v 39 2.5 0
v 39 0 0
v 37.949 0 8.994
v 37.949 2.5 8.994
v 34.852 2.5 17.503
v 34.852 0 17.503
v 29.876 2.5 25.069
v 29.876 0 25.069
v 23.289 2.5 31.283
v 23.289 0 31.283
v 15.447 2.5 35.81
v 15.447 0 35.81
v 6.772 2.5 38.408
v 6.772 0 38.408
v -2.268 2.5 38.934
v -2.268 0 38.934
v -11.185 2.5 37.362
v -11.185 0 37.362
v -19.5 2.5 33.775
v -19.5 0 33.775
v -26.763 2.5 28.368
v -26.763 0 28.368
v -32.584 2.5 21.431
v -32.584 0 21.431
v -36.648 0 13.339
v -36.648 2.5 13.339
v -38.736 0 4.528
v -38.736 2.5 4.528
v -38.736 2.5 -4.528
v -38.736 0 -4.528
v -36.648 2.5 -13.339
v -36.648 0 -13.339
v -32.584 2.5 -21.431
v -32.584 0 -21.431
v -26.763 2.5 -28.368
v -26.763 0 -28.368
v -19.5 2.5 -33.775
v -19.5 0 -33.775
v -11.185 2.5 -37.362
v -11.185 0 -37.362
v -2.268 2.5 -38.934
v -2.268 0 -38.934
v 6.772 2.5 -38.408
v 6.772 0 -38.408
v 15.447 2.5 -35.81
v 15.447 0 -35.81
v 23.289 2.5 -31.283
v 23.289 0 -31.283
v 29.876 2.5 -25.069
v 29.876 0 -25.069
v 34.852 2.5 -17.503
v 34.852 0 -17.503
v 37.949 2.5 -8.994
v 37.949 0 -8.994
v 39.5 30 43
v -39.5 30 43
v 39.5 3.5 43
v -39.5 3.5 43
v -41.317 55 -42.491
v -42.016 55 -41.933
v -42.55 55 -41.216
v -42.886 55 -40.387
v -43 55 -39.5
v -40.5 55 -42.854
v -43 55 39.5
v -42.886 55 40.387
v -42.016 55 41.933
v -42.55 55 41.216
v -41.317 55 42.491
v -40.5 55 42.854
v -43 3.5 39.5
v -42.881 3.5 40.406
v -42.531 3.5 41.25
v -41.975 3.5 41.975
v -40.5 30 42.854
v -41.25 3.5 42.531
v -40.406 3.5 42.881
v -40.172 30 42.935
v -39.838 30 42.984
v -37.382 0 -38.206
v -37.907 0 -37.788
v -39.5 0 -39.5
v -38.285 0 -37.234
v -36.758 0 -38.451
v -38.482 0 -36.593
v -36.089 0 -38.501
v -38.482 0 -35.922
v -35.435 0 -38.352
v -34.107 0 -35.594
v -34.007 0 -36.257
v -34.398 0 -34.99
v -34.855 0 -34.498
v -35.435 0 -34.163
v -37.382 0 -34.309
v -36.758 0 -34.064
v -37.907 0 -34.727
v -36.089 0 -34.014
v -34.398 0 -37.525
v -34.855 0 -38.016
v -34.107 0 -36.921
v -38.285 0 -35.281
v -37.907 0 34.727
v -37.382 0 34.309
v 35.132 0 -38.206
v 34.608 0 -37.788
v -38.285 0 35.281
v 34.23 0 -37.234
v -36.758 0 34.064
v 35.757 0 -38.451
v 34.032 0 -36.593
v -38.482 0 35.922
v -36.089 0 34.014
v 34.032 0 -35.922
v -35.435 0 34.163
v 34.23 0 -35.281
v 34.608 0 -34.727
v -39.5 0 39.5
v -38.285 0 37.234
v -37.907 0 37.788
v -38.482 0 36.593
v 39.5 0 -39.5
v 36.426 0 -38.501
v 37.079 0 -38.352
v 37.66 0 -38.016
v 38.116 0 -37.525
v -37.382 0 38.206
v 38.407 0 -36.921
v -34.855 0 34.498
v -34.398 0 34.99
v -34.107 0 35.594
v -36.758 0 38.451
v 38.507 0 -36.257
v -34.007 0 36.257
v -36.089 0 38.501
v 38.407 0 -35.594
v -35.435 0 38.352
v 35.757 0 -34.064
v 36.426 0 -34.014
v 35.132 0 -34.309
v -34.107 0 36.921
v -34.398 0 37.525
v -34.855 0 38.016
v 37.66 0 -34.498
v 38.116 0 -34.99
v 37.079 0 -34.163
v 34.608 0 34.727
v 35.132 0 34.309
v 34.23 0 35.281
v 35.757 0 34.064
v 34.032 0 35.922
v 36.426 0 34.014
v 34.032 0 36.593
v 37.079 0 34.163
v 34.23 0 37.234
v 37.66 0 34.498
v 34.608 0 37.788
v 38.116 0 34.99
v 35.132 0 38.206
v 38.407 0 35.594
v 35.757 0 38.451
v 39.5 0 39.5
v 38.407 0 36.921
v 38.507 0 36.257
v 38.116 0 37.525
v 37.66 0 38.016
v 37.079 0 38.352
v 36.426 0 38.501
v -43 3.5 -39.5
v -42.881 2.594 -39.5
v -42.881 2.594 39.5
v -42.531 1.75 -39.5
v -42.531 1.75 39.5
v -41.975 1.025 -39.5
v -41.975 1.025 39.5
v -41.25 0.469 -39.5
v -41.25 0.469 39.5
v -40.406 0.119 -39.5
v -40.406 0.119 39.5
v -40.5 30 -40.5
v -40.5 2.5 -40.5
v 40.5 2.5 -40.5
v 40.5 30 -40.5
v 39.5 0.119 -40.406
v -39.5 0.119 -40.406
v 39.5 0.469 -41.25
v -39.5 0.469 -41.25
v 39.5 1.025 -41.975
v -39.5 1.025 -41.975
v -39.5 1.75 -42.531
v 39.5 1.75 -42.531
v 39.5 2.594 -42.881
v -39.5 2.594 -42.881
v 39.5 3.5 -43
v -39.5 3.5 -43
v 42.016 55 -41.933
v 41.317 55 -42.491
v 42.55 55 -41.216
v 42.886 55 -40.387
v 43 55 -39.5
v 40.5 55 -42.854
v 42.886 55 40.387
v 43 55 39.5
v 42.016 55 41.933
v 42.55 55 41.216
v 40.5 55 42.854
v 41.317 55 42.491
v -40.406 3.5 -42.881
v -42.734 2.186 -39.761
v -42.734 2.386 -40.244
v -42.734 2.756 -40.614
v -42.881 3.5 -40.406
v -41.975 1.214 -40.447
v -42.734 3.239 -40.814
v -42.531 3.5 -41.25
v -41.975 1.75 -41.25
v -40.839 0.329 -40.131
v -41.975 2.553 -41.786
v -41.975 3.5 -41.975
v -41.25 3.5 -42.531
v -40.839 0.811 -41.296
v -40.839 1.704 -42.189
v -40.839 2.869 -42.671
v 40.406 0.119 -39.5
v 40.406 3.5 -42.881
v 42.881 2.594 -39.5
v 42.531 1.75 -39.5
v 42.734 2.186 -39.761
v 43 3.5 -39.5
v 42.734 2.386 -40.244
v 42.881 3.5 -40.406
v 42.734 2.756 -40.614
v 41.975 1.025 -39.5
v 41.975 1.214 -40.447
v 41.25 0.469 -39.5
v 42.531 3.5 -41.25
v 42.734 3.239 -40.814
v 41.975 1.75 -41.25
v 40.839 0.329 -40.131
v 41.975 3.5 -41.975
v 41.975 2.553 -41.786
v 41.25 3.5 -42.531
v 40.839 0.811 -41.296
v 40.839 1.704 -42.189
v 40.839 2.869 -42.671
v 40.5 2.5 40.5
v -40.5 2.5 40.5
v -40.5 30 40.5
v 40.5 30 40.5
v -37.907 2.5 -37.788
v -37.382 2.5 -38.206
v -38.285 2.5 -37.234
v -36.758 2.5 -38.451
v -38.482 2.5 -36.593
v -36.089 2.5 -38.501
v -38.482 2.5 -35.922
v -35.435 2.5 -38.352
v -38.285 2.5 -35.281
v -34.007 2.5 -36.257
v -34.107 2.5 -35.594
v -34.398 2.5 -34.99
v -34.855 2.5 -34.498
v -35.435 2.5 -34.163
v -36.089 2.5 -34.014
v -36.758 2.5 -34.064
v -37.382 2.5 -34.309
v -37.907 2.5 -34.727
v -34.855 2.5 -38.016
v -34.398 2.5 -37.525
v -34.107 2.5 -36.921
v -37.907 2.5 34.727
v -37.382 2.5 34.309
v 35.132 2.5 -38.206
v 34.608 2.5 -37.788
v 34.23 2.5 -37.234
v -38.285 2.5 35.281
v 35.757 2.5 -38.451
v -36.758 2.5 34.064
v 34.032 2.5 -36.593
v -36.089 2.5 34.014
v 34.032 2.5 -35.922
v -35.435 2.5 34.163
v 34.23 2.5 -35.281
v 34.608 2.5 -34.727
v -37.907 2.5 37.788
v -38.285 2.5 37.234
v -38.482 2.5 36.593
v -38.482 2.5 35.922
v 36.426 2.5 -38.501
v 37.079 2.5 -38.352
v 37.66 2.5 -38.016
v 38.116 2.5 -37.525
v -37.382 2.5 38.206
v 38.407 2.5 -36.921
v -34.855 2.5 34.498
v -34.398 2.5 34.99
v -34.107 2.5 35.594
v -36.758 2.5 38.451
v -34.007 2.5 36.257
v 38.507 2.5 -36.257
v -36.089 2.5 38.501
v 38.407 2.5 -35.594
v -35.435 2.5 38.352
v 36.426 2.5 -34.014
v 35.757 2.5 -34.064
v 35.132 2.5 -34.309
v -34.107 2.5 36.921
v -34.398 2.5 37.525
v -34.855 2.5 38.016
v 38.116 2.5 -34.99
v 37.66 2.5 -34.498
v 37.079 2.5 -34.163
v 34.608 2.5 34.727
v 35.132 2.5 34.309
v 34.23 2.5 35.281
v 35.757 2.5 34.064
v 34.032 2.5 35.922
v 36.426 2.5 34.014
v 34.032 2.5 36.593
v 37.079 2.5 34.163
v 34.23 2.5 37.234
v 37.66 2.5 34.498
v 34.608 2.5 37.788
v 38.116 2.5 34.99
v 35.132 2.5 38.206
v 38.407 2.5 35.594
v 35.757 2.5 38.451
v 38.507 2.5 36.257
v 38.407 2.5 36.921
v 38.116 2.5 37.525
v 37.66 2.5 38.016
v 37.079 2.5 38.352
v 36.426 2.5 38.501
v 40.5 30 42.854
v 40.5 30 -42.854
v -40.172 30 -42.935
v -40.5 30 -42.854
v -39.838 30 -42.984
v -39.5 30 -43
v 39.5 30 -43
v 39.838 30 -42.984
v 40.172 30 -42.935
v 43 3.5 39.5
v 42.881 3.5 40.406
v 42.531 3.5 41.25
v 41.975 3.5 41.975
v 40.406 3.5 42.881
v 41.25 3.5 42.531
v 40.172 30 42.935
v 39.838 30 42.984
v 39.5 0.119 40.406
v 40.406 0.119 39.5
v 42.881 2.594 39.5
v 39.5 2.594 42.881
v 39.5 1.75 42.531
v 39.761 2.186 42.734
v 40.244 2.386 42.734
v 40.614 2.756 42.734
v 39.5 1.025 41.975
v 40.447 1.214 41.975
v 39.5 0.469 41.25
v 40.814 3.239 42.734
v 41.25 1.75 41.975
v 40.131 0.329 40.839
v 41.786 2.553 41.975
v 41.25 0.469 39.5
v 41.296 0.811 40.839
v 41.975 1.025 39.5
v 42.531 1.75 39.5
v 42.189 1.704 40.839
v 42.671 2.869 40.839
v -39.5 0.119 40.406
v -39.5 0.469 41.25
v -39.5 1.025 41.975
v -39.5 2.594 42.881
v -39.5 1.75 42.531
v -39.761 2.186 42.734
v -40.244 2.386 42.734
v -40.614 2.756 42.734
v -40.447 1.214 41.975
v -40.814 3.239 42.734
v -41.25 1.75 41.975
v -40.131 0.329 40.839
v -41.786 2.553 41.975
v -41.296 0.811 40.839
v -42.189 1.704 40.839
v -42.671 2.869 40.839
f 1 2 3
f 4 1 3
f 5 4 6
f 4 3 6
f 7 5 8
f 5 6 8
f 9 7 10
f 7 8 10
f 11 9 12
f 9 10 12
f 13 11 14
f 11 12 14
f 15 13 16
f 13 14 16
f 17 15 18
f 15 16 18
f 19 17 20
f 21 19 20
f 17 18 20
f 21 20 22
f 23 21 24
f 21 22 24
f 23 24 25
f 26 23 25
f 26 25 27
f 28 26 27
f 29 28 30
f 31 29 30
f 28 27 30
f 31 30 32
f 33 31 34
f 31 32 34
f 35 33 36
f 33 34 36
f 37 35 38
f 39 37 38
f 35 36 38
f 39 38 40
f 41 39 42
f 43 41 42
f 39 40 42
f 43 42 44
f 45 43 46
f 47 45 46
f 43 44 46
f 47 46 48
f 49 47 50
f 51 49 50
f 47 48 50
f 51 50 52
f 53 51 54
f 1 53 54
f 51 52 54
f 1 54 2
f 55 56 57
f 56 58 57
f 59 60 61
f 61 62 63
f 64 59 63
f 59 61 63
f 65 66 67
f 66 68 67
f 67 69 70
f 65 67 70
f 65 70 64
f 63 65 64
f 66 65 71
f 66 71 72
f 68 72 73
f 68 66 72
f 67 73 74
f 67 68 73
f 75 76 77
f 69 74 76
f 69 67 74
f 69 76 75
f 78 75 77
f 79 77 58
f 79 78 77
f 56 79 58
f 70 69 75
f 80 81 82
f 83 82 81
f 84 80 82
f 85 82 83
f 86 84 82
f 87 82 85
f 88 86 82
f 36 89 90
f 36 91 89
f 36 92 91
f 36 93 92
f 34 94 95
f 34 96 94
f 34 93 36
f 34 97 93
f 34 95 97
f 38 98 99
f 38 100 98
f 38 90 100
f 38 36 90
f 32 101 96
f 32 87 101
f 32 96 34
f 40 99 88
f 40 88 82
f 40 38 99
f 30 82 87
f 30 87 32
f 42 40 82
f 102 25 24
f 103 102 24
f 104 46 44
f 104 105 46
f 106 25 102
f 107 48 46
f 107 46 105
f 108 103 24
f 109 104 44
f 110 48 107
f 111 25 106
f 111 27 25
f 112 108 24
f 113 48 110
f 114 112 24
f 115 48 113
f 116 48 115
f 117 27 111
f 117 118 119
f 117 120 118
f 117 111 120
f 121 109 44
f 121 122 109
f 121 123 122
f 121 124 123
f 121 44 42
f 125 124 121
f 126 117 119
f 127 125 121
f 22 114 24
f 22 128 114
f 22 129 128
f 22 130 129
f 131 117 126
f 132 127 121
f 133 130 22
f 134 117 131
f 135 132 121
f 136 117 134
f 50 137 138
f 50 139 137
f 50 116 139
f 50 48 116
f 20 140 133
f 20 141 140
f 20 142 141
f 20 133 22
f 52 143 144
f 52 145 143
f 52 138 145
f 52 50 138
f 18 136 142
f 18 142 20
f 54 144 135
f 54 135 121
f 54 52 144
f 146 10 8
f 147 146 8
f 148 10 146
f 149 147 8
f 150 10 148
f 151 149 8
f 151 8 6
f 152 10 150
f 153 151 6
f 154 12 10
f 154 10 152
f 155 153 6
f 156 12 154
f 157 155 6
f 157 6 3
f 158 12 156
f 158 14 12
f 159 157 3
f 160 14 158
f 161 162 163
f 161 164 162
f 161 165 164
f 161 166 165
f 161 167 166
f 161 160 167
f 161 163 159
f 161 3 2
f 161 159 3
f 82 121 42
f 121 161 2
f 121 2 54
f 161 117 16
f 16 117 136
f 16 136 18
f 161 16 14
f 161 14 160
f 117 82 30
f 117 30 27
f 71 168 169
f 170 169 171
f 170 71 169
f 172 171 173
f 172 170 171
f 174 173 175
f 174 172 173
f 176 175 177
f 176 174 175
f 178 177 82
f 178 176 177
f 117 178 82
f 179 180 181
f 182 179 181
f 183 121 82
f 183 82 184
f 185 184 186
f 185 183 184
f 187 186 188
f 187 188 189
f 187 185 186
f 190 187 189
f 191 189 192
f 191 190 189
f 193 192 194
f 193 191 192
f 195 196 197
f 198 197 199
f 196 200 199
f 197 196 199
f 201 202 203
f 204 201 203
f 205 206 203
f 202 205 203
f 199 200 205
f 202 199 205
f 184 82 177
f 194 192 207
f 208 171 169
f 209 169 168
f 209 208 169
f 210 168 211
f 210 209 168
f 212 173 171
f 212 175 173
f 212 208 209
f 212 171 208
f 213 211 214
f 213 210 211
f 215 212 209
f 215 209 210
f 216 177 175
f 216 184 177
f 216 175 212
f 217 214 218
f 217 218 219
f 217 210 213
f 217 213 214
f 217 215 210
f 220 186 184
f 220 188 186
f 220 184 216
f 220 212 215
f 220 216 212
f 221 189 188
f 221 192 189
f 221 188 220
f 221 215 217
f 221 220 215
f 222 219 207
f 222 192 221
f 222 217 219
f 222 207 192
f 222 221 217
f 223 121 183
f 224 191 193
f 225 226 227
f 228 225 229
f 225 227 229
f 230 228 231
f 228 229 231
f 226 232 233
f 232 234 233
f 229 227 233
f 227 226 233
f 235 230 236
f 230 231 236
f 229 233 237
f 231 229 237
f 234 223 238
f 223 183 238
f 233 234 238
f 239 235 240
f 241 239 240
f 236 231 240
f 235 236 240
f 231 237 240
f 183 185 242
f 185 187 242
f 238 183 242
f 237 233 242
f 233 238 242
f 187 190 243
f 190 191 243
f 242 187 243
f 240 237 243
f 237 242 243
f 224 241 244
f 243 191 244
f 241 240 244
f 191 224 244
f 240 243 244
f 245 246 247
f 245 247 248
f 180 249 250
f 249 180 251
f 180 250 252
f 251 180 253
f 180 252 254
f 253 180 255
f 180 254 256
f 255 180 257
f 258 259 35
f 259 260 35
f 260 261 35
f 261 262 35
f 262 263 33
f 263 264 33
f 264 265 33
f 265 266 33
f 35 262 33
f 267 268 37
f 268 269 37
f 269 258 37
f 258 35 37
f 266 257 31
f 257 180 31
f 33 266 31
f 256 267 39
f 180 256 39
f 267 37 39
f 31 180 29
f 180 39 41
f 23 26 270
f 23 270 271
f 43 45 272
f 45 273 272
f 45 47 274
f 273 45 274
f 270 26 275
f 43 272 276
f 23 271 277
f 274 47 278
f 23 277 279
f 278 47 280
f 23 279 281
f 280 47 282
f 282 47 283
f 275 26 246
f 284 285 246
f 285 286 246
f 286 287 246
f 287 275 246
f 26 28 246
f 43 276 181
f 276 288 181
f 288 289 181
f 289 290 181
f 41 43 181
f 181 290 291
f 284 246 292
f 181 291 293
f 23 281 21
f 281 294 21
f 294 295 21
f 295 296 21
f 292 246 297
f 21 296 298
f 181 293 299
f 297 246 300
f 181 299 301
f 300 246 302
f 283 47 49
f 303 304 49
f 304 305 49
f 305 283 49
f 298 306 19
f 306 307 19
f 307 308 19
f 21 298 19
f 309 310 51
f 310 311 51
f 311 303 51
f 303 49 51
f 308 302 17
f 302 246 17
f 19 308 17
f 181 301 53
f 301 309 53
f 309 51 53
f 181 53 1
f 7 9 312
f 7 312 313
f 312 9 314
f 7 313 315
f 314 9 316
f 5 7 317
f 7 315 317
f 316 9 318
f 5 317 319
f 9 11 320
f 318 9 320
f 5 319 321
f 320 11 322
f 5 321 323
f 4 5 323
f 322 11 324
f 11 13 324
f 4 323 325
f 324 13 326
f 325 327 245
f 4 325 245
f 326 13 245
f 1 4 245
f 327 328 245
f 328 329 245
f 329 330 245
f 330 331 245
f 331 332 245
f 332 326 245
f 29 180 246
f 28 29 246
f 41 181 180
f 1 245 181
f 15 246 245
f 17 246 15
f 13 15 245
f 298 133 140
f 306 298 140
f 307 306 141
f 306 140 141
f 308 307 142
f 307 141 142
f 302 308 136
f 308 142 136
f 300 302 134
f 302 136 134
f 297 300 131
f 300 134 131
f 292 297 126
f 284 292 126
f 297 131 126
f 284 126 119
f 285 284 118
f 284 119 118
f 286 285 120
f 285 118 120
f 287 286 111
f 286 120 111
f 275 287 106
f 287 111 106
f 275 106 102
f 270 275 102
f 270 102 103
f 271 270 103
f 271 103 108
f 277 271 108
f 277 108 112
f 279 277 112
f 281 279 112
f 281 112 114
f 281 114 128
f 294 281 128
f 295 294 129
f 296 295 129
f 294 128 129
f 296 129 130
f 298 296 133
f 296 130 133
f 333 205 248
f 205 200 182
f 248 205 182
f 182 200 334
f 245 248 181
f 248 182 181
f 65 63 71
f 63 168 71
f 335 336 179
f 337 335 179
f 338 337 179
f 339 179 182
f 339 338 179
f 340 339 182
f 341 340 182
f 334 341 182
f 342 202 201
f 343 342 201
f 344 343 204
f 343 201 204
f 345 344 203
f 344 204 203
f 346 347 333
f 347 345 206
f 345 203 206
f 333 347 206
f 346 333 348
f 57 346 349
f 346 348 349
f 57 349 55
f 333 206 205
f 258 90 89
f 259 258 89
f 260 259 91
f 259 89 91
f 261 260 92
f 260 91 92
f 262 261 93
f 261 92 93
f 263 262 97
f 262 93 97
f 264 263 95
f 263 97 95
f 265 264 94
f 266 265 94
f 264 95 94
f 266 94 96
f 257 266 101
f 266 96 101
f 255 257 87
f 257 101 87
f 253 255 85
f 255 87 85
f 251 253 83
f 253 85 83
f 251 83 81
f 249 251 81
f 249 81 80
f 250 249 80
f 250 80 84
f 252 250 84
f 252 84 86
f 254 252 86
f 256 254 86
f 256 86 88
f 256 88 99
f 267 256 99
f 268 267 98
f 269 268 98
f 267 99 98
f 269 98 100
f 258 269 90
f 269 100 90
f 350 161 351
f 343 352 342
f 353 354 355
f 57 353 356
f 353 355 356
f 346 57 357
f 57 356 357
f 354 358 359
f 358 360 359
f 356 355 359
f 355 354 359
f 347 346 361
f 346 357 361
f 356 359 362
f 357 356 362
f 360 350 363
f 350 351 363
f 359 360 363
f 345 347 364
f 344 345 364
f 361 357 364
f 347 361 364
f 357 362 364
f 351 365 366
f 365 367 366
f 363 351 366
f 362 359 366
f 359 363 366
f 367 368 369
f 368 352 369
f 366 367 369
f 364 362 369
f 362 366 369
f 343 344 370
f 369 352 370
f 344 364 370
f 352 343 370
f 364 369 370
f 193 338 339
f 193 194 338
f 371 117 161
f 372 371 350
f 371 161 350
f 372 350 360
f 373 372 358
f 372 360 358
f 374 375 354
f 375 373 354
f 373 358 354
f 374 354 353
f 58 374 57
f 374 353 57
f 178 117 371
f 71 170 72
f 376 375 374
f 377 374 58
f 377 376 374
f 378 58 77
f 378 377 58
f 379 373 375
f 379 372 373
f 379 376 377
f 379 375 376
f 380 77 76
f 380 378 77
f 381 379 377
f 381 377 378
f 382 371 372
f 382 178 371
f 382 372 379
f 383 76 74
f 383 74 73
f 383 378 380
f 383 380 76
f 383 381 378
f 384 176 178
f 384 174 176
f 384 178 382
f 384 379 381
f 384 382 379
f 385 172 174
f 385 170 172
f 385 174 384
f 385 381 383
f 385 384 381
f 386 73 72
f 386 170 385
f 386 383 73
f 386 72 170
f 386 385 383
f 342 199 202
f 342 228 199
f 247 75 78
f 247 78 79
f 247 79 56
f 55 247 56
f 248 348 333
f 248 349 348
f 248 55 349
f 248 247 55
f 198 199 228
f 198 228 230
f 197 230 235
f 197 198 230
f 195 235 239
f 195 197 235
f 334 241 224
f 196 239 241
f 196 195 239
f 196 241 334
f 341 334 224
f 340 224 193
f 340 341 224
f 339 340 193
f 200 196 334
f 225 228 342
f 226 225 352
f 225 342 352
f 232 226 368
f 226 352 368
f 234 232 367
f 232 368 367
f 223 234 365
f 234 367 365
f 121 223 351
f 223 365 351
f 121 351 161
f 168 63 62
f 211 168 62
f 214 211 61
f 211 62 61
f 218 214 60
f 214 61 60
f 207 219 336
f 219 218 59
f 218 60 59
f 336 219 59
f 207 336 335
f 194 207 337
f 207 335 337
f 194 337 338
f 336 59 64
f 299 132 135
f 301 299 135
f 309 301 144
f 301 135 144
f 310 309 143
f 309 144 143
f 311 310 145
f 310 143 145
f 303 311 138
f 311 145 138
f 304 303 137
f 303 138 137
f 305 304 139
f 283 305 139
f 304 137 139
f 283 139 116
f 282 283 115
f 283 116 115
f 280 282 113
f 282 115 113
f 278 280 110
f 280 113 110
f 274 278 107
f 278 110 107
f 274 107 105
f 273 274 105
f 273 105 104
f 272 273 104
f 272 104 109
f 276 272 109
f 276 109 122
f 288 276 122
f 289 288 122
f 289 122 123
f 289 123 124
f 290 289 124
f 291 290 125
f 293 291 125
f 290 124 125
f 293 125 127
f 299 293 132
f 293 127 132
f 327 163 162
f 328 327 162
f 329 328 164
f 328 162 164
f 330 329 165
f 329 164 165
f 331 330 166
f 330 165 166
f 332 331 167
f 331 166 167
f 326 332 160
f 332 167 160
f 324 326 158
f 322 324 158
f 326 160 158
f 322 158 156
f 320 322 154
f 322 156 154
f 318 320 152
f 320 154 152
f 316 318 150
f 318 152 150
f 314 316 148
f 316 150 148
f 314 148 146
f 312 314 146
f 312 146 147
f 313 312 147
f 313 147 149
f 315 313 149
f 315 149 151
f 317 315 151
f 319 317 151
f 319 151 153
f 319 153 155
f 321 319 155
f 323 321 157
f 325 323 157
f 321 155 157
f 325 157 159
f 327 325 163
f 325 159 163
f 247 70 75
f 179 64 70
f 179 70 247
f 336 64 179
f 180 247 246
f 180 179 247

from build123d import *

# Parameters (mm, degrees)
F0_W     = 81
F0_H     = 81
F0_R     = 2.25
F0_R_2   = 39
F1_DEPTH = 2.5
F0_W_2   = 86
F0_H_2   = 86
F2_DEPTH = 55
F3_W     = 81
F3_H     = 25
F4_DEPTH = 100
F5_R     = 3.5


with BuildPart() as f1:
    # F0 (on Front) → F1 (new body)
    with BuildSketch(Plane.XZ):
        Rectangle(F0_W, F0_H)
        with Locations((-36.257359, -36.257359)):
            Circle(F0_R, mode=Mode.SUBTRACT)
        with Locations((36.257359, -36.257359)):
            Circle(F0_R, mode=Mode.SUBTRACT)
        with Locations((-36.257359, 36.257359)):
            Circle(F0_R, mode=Mode.SUBTRACT)
        Circle(F0_R_2, mode=Mode.SUBTRACT)
        with Locations((36.257359, 36.257359)):
            Circle(F0_R, mode=Mode.SUBTRACT)
    extrude(amount=-F1_DEPTH)

    # F0 (on Front) → F2 (join)
    with BuildSketch(Plane.XZ):
        Rectangle(F0_W_2, F0_H_2)
        Rectangle(F0_W, F0_H, mode=Mode.SUBTRACT)
    extrude(amount=-F2_DEPTH)

    # F3 (on face) → F4 (cut)
    with BuildSketch(Plane(origin=(0, 0, -43), x_dir=(1, 0, 0), z_dir=(0, 0, -1))):
        with Locations((0, -42.5)):
            Rectangle(F3_W, F3_H)
    extrude(amount=-F4_DEPTH, mode=Mode.SUBTRACT)

    # F5
    f5_edges = [f1.edges().sort_by_distance(p)[0] for p in [
        (0, 0, -43),
        (-43, 0, 0),
        (43, 0, 0),
        (0, 0, 43),
        (-43, 27.5, 43),
        (-43, 27.5, -43),
        (43, 27.5, -43),
        (43, 27.5, 43),
    ]]
    fillet(f5_edges, radius=F5_R)


solid = f1.part
